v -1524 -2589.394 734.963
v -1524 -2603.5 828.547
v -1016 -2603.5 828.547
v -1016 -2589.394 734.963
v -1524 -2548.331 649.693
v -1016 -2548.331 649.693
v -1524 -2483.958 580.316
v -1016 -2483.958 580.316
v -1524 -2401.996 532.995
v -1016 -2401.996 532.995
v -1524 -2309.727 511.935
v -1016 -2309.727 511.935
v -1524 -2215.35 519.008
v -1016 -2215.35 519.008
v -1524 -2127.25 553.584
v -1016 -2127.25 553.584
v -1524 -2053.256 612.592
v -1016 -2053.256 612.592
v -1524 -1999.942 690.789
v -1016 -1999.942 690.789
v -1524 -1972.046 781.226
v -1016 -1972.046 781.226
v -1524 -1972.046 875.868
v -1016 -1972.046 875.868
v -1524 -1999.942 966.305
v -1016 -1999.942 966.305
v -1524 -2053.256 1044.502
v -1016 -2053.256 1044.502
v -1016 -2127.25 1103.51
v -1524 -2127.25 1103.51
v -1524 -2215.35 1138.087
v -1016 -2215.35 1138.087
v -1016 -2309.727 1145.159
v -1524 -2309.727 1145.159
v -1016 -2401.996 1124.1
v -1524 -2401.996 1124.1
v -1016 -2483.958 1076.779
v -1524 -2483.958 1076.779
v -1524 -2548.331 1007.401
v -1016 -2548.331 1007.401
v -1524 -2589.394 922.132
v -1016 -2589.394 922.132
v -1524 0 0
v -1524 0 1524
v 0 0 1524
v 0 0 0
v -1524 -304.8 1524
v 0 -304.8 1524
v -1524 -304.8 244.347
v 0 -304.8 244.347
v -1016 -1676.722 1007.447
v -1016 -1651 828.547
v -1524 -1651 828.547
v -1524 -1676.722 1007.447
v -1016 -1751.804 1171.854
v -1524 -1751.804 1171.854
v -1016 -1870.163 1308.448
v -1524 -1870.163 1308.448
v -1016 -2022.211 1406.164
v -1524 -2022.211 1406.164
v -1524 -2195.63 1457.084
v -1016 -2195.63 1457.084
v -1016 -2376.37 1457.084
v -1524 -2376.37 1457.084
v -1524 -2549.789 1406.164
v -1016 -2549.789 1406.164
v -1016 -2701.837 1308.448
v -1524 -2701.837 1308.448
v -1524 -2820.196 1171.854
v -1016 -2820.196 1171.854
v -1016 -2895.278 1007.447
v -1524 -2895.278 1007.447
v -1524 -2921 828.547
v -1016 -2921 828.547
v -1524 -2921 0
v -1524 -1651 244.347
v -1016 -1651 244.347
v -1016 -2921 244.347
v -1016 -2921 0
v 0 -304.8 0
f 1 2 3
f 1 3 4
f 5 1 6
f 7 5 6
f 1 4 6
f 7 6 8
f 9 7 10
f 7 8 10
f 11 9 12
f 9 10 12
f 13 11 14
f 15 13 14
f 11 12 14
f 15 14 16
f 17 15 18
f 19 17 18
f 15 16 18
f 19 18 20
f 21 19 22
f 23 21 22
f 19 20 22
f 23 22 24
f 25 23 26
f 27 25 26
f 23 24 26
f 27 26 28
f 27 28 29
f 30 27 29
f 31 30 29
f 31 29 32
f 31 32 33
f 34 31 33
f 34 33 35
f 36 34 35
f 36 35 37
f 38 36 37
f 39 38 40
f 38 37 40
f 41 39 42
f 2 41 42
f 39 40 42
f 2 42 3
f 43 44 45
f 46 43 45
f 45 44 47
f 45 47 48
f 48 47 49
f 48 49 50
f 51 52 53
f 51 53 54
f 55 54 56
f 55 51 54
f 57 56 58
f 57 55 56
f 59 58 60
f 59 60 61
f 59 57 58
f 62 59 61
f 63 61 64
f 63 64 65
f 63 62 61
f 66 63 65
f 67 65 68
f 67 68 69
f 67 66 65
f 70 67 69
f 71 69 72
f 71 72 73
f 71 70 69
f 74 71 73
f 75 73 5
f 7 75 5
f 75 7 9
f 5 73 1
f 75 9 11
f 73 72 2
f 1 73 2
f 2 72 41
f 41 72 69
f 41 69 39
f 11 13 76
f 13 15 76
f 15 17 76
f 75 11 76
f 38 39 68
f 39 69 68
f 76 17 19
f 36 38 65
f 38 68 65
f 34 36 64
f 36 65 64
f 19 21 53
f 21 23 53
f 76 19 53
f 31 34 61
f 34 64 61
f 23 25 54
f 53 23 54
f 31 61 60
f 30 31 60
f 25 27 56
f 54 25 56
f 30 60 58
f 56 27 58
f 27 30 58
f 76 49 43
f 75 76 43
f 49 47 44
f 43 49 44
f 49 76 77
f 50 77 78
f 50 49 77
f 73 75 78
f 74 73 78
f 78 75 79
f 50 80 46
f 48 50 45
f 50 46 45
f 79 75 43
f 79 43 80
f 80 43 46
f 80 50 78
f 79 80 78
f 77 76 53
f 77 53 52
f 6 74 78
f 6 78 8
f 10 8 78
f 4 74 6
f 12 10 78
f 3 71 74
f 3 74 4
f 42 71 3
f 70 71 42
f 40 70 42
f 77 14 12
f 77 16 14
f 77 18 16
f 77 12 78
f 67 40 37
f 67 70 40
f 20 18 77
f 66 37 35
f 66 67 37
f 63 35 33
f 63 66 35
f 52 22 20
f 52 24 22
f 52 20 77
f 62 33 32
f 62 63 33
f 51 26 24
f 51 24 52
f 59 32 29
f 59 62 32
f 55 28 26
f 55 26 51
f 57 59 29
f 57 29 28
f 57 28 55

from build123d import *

# Parameters (mm, degrees)
F0_W      = 1524
F0_H      = 1524
F1_DEPTH  = 304.8
F2_W      = 1524
F2_H      = 244.3472892046
F3_DEPTH  = 2616.2
F4_W      = 508
F4_H      = 1270
F5_DEPTH  = 584.2
F7_DEPTH  = 508
F9_DEPTH  = 508
F11_DEPTH = 304.8


with BuildPart() as f1:
    # F0 (on Front) → F1 (new body)
    with BuildSketch(Plane.XZ):
        with Locations((-762, 762)):
            Rectangle(F0_W, F0_H)
    extrude(amount=F1_DEPTH)

    # F2 (on face) → F3 (join)
    with BuildSketch(Plane.XZ.offset(304.8)):
        with Locations((-762, 122.1736446023)):
            Rectangle(F2_W, F2_H)
    extrude(amount=F3_DEPTH)

    # F4 (on face) → F5 (join)
    with BuildSketch(Plane.XY.offset(244.3472892046)):
        with Locations((-1270, -2286)):
            Rectangle(F4_W, F4_H)
    extrude(amount=F5_DEPTH)

    # F6 (on face) → F7 (join)
    with BuildSketch(Plane.YZ.offset(-1016)):
        with BuildLine():
            Line((-2921, 828.5472892046), (-1651, 828.5472892046))
            ThreePointArc((-1651, 828.5472892046), (-2286, 1463.5472892046), (-2921, 828.5472892046))
        make_face()
        with BuildLine():
            ThreePointArc((-2534.8681578667, 244.3472892046), (-2286, 193.5472892046), (-2037.1318421333, 244.3472892046))
            Line((-2037.1318421333, 244.3472892046), (-2534.8681578667, 244.3472892046))
        make_face()
    extrude(amount=-F7_DEPTH)

    # F8 (on face) → F9 (cut)
    with BuildSketch(Plane.YZ.offset(-1016)):
        with BuildLine():
            Line((-2603.5, 828.5472892046), (-1968.5, 828.5472892046))
            ThreePointArc((-1968.5, 828.5472892046), (-2286, 1146.0472892046), (-2603.5, 828.5472892046))
        make_face()
        with BuildLine():
            ThreePointArc((-2603.5, 828.5472892046), (-2286, 511.0472892046), (-1968.5, 828.5472892046))
            Line((-1968.5, 828.5472892046), (-2603.5, 828.5472892046))
        make_face()
    extrude(amount=-F9_DEPTH, mode=Mode.SUBTRACT)

    # F10 (on face) → F11 (cut)
    with BuildSketch(Plane.XY.offset(244.3472892046)):
        Polygon((0, -304.8), (-1016, -2921), (0, -2921), align=None)
    extrude(amount=-F11_DEPTH, mode=Mode.SUBTRACT)


solid = f1.part
